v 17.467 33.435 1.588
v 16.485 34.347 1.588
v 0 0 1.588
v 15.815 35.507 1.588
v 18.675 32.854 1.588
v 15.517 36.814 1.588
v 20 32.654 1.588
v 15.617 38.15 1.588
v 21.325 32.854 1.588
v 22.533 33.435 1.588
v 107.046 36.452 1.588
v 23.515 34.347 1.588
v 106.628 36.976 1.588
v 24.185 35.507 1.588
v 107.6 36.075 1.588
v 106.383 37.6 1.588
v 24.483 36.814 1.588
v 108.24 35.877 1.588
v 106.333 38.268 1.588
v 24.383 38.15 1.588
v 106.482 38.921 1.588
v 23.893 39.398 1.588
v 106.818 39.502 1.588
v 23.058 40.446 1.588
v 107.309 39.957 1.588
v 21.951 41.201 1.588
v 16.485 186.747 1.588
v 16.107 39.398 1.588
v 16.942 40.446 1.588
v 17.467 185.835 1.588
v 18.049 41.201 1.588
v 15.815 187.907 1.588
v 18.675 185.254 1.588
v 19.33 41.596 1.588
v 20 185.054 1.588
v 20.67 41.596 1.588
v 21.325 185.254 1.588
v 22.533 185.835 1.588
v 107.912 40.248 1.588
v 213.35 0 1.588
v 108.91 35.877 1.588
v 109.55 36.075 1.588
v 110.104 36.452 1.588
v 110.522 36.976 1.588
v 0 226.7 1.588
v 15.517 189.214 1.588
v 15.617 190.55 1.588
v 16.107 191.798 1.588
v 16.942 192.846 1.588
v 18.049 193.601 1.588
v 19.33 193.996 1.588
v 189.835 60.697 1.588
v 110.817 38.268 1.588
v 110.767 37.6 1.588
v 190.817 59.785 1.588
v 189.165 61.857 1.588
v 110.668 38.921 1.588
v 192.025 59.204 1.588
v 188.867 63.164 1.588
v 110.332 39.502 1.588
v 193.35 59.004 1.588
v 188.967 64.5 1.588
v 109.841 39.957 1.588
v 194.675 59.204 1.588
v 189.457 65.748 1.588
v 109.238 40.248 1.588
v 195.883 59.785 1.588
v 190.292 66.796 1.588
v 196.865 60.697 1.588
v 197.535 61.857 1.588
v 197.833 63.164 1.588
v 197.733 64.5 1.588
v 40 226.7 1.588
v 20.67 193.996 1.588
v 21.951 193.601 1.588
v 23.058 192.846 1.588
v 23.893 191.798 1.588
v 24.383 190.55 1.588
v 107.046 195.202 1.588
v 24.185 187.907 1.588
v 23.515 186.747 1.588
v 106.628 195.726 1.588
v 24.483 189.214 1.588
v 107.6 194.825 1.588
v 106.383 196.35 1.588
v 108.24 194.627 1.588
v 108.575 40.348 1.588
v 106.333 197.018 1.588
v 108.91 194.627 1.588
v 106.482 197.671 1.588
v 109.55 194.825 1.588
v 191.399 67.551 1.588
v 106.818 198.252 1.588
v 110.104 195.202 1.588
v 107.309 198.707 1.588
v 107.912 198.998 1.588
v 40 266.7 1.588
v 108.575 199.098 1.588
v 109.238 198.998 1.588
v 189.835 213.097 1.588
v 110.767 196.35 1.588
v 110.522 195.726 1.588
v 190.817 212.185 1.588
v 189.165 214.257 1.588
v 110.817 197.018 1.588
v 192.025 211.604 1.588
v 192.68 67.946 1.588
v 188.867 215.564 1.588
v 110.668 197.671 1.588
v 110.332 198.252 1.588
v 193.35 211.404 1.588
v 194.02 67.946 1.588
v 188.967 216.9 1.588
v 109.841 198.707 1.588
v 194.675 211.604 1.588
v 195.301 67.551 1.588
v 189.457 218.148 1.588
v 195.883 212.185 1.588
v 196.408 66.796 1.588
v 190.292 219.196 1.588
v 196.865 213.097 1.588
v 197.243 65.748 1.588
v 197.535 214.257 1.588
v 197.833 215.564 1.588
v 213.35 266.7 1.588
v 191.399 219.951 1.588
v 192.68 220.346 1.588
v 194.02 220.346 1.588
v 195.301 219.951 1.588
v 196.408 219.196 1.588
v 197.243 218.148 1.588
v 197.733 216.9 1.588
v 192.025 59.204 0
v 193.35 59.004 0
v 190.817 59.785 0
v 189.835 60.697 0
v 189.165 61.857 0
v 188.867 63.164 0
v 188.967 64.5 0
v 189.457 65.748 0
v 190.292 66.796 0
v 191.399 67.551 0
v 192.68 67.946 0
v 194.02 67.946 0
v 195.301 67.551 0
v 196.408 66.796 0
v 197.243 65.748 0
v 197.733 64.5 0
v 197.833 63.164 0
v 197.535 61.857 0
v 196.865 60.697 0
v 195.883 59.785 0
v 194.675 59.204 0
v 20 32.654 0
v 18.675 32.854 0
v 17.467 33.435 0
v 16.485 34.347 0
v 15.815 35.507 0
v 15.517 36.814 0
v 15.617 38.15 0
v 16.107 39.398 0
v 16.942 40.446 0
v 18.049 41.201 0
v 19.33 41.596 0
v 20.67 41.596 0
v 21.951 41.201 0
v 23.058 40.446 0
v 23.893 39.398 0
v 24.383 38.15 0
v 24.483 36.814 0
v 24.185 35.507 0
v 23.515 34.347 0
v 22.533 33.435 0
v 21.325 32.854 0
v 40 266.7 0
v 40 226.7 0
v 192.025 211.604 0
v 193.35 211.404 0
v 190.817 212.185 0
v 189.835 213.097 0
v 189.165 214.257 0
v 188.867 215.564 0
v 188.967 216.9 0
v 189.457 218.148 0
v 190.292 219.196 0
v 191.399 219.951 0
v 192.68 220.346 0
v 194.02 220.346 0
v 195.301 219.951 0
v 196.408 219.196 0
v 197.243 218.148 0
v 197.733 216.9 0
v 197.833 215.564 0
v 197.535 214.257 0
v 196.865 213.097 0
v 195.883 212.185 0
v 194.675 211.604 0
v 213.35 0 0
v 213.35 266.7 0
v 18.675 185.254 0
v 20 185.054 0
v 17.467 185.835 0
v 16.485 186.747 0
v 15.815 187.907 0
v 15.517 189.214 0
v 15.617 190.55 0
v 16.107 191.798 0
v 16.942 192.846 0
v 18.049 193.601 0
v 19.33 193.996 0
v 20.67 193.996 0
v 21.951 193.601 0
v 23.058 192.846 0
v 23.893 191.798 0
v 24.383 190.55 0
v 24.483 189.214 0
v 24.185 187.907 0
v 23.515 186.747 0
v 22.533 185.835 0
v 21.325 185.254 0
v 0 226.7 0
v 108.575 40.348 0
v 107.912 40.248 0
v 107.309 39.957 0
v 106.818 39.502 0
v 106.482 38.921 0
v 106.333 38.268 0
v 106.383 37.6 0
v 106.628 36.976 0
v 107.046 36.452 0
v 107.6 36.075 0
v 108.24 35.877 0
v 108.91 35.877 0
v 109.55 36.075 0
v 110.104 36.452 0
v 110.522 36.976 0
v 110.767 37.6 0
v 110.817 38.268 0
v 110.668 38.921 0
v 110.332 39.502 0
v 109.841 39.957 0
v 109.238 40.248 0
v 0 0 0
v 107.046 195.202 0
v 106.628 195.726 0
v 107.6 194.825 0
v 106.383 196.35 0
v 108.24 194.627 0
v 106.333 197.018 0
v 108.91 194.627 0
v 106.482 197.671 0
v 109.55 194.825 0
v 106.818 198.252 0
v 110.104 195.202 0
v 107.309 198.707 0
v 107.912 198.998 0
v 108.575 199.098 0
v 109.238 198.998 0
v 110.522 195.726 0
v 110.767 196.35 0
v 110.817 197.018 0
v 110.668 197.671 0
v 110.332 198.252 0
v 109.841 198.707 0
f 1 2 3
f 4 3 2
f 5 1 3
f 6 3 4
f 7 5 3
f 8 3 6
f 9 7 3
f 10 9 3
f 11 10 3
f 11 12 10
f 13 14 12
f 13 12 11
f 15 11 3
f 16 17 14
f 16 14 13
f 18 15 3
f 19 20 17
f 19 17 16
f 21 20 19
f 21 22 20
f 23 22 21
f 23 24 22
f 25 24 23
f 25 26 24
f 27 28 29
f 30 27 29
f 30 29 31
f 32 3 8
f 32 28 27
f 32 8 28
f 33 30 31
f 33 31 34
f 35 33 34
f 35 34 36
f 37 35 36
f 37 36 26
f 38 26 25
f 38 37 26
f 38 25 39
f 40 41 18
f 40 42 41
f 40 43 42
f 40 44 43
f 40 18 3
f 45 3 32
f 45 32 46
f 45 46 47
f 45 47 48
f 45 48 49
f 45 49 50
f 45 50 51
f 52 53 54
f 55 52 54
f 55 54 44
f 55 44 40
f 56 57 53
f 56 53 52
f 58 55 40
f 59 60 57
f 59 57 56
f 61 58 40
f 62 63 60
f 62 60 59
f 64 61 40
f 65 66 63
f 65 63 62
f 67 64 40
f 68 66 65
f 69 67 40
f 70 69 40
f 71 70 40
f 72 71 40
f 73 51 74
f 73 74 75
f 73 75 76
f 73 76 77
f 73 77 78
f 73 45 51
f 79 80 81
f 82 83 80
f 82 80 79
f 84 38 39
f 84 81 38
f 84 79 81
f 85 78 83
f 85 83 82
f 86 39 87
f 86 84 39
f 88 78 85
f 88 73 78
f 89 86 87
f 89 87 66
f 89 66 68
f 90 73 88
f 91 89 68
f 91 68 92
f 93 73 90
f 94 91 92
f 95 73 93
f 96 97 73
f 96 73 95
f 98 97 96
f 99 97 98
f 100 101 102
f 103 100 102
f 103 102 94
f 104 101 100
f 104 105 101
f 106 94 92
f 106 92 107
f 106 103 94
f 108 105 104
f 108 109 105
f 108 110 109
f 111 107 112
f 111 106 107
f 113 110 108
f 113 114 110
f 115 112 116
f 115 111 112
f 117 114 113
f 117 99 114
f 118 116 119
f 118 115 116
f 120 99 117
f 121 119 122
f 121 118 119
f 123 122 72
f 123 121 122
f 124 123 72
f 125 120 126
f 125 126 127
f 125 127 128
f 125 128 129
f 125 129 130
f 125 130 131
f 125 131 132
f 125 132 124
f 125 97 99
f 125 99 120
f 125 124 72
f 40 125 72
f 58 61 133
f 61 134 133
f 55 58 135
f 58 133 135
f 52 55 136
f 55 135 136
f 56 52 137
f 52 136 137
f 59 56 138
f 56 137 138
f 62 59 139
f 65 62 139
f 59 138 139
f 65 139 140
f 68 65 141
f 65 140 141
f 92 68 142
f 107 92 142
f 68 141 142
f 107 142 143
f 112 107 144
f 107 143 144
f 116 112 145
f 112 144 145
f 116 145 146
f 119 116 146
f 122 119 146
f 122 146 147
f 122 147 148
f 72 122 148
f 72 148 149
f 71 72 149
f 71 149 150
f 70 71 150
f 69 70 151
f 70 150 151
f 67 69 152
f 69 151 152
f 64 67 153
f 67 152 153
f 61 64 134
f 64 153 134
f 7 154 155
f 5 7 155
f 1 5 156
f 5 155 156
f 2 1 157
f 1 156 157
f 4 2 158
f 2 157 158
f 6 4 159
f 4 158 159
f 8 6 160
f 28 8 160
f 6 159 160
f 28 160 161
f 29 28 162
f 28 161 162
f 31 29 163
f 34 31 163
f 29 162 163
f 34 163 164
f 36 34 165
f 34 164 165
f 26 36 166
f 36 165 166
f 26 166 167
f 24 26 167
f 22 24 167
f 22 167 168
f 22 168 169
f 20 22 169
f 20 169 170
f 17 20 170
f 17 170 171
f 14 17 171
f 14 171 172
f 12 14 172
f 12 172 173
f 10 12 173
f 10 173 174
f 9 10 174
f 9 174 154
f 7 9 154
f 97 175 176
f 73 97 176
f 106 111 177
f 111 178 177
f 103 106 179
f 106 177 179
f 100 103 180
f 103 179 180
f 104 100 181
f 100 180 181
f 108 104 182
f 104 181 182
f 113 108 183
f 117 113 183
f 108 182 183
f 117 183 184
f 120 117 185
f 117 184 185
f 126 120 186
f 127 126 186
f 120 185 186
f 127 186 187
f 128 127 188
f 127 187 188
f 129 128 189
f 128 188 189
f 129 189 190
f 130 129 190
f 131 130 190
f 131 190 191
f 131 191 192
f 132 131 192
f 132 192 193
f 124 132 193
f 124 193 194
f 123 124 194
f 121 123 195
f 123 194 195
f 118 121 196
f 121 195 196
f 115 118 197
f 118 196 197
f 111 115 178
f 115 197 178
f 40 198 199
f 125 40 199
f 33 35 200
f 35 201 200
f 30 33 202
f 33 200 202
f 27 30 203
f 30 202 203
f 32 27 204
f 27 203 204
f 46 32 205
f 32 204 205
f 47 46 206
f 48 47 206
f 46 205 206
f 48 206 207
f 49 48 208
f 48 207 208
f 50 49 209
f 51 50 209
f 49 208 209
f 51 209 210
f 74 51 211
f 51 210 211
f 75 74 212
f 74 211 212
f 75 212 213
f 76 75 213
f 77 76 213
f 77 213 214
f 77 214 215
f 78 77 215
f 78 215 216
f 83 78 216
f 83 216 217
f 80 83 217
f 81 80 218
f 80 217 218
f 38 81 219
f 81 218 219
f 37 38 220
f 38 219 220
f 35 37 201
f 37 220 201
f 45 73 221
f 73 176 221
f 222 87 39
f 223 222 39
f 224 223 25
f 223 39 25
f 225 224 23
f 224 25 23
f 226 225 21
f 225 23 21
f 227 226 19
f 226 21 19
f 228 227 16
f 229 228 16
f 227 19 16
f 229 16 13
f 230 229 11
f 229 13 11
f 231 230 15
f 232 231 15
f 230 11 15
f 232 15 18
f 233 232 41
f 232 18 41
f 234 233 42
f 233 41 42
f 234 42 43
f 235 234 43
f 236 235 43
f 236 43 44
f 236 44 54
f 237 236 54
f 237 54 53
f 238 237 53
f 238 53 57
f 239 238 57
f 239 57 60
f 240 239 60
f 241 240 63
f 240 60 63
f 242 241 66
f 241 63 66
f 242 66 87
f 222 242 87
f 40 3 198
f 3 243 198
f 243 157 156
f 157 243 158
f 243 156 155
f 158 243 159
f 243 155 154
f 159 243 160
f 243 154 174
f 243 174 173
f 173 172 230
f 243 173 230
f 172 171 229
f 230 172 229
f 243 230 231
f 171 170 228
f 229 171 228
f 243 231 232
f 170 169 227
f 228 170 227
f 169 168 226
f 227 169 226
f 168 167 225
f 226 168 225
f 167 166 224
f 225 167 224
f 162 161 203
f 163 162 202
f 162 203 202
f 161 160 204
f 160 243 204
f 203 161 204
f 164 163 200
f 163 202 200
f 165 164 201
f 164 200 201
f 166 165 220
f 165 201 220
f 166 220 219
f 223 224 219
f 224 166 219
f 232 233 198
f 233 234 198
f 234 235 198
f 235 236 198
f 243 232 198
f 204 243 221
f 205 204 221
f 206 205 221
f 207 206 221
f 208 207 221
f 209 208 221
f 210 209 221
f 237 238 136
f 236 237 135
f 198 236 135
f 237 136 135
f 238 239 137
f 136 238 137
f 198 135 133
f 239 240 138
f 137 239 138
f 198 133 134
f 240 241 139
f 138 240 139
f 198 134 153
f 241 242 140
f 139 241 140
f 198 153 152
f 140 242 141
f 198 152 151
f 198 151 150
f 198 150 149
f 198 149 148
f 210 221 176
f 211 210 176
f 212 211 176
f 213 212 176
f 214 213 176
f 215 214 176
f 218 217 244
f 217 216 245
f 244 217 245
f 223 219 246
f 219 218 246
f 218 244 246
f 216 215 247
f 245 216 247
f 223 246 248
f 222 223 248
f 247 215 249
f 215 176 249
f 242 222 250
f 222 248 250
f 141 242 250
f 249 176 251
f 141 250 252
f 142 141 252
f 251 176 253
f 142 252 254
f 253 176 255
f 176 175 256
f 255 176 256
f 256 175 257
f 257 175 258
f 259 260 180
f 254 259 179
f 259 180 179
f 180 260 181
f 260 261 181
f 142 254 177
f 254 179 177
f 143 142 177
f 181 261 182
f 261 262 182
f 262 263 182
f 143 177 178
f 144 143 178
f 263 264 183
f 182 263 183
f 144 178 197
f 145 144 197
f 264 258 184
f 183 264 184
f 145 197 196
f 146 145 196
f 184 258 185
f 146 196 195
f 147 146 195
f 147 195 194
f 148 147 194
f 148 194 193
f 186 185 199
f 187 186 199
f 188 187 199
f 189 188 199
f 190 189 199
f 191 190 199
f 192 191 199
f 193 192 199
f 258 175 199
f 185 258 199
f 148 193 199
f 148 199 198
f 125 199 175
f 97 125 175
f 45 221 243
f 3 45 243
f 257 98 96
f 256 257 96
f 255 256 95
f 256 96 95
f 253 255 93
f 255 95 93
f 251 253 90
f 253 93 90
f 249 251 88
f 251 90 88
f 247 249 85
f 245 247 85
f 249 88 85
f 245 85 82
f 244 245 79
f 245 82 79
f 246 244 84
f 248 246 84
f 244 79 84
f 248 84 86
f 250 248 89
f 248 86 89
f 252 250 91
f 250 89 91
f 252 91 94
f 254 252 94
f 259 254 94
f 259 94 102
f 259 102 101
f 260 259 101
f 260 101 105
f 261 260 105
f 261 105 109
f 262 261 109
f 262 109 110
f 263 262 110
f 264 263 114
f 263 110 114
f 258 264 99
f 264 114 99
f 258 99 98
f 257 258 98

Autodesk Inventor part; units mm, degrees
ref_plane "YZ Plane" through (0, 0, 0) normal (1, 0, 0) x (0, 1, 0)
ref_plane "XZ Plane" through (0, 0, 0) normal (0, 1, 0) x (-1, 0, 0)
ref_plane "XY Plane" through (0, 0, 0) normal (0, 0, 1) x (1, 0, 0)
sketch "Sketch1" plane through (0, 0, 0) normal (0, 0, 1) x (1, 0, 0)
  line L0 (0, 0) -> (213.35, 0)
  line L1 (213.35, 0) -> (213.35, 266.7)
  line L2 (213.35, 266.7) -> (0, 266.7)
  line L3 (0, 266.7) -> (0, 0)
  line L4 (0, 0) -> (41.275, 0)
  line L5 (0, 41.275) -> (0, 0)
  line L6 (0, 266.7) -> (40, 266.7)
  line L7 (40, 266.7) -> (40, 226.7)
  line L8 (40, 226.7) -> (0, 226.7)
  line L9 (0, 226.7) -> (0, 266.7)
  dimension "d0" = 266.7
  dimension "d1" = 213.35
  dimension "d4" = 40
extrude "Extrusion1" add sketch "Sketch1" along normal blind 1.5875 contours L3 L8 L7 L2 L1 L0
sketch "Sketch2" plane through (0, 0, 1.5875) normal (0, 0, 1) x (1, 0, 0)
  line L0 (213.35, 0) -> (0, 0)
  line L1 (213.35, 266.7) -> (213.35, 0)
  line L2 (40, 266.7) -> (213.35, 266.7)
  line L3 (20, 189.55) -> (20, 37.15)
  line L4 (40, 266.7) -> (40, 226.7) projected
  line L5 (40, 266.7) -> (213.35, 266.7) projected
  line L6 (0, 0) -> (0, 226.7)
  line L7 (0, 226.7) -> (40, 226.7)
  line L8 (213.35, 266.7) -> (213.35, 0) projected
  line L9 (193.35, 215.9) -> (193.35, 63.5)
  point P0 (41.275, 0)
  point P1 (126.675, 266.7)
  point P2 (20, 113.35)
  point P3 (0, 113.35)
  dimension "d9" = 152.4
  dimension "d19" = 20
  dimension "d20" = 20
  dimension "d21" = 152.4
  dimension "d22" = 50.8
hole "Mounting Holes" at (20, 189.55, 1.5875) at (20, 37.15, 1.5875) at (193.35, 215.9, 1.5875) at (193.35, 63.5, 1.5875) direction (0, 0, -1) diameter 8.9916 end through all clearance for "Flat Head Machine Screw" size "M8" standard "Ansi Metric M Profile"
sketch "Sketch3" plane through (0, 0, 0) normal (0, 0, -1) x (-1, 0, 0)
  line L0 (-213.35, 0) -> (-213.35, 266.7) projected
  line L1 (0, 0) -> (-213.35, 0) projected
  line L2 (0, 226.7) -> (-40, 226.7) projected
  line L3 (-108.575, 196.85) -> (-108.575, 38.1)
  dimension "d23" = 104.775
  dimension "d24" = 158.75
  dimension "d25" = 38.1
hole "DIN Rail Holes" at (108.575, 196.85, 0) at (108.575, 38.1, 0) direction (0, 0, 1) diameter 4.4958 end through all clearance for "Flat Head Machine Screw (82)" size "#8" standard "Ansi Unified Screw Threads"
properties part number "front left plate" material "Aluminum-6061"
